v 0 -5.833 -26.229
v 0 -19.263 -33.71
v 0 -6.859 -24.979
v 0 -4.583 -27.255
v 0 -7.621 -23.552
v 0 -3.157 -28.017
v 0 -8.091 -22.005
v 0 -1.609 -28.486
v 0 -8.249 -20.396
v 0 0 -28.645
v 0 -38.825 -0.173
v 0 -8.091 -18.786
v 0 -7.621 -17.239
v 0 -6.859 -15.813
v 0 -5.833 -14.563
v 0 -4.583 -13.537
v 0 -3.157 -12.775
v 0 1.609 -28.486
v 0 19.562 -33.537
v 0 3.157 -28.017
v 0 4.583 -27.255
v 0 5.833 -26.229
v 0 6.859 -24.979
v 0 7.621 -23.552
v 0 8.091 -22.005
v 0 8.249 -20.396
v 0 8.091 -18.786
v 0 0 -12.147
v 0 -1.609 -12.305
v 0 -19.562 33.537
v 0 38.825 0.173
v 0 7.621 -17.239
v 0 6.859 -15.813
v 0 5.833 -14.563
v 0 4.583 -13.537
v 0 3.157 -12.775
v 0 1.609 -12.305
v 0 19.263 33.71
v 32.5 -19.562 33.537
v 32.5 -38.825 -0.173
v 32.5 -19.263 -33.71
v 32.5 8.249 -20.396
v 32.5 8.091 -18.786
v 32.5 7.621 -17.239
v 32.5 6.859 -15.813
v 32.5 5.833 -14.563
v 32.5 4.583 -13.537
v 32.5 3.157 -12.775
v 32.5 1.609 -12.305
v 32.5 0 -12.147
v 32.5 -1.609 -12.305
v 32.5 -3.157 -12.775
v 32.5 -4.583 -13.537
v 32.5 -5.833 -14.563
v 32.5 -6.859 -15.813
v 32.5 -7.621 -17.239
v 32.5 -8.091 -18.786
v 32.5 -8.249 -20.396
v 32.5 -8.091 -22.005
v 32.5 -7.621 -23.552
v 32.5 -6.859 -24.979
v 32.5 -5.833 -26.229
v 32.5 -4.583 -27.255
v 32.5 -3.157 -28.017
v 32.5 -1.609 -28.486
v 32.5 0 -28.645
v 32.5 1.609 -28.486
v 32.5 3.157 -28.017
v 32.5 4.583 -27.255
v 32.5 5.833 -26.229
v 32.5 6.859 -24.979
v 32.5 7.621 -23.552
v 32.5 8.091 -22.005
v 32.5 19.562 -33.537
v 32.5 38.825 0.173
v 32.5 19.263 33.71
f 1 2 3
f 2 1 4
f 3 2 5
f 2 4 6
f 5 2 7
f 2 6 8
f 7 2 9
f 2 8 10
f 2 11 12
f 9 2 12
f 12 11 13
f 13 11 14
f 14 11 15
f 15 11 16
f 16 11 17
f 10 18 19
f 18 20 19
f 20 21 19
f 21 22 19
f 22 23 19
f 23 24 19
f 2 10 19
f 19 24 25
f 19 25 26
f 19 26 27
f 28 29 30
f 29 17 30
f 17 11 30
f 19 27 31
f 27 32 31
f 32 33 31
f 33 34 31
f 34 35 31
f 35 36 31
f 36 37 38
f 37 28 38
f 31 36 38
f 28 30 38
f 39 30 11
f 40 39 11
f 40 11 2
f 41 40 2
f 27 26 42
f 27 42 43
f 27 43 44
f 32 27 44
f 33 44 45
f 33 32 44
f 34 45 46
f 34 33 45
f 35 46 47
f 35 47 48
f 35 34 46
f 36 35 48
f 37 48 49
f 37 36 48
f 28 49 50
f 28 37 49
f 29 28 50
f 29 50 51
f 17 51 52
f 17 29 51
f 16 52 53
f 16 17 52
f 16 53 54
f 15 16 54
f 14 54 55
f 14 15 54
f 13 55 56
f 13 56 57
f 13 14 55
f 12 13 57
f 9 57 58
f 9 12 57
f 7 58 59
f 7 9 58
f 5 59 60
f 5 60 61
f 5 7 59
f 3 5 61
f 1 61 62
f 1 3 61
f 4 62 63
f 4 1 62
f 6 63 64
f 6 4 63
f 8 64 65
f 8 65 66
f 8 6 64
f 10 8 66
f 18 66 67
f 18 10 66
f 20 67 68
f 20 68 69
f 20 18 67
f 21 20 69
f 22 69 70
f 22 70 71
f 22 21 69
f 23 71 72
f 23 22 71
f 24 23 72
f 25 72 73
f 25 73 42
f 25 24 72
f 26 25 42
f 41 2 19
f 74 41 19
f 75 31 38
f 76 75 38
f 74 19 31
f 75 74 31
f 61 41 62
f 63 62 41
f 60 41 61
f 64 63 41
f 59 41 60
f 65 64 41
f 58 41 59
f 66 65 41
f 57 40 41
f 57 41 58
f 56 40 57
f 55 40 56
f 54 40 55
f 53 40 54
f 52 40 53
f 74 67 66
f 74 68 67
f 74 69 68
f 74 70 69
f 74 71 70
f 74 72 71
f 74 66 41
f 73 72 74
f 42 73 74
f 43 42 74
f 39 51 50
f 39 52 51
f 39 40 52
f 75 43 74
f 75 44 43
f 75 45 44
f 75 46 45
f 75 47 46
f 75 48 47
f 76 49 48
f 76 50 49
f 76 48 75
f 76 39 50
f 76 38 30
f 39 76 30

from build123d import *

# Parameters (mm, degrees)
F0_R     = 8.249045
F1_DEPTH = 32.5


with BuildPart() as f1:
    # F0 (on Right) → F1 (new body)
    with BuildSketch(Plane.YZ):
        Polygon((38.824608, 0.172873), (19.262591, 33.709534), (-19.562017, 33.53666), (-38.824608, -0.172873), (-19.262591, -33.709534), (19.562017, -33.53666), align=None)
        with Locations((0, -20.395683)):
            Circle(F0_R, mode=Mode.SUBTRACT)
    extrude(amount=F1_DEPTH)


solid = f1.part
